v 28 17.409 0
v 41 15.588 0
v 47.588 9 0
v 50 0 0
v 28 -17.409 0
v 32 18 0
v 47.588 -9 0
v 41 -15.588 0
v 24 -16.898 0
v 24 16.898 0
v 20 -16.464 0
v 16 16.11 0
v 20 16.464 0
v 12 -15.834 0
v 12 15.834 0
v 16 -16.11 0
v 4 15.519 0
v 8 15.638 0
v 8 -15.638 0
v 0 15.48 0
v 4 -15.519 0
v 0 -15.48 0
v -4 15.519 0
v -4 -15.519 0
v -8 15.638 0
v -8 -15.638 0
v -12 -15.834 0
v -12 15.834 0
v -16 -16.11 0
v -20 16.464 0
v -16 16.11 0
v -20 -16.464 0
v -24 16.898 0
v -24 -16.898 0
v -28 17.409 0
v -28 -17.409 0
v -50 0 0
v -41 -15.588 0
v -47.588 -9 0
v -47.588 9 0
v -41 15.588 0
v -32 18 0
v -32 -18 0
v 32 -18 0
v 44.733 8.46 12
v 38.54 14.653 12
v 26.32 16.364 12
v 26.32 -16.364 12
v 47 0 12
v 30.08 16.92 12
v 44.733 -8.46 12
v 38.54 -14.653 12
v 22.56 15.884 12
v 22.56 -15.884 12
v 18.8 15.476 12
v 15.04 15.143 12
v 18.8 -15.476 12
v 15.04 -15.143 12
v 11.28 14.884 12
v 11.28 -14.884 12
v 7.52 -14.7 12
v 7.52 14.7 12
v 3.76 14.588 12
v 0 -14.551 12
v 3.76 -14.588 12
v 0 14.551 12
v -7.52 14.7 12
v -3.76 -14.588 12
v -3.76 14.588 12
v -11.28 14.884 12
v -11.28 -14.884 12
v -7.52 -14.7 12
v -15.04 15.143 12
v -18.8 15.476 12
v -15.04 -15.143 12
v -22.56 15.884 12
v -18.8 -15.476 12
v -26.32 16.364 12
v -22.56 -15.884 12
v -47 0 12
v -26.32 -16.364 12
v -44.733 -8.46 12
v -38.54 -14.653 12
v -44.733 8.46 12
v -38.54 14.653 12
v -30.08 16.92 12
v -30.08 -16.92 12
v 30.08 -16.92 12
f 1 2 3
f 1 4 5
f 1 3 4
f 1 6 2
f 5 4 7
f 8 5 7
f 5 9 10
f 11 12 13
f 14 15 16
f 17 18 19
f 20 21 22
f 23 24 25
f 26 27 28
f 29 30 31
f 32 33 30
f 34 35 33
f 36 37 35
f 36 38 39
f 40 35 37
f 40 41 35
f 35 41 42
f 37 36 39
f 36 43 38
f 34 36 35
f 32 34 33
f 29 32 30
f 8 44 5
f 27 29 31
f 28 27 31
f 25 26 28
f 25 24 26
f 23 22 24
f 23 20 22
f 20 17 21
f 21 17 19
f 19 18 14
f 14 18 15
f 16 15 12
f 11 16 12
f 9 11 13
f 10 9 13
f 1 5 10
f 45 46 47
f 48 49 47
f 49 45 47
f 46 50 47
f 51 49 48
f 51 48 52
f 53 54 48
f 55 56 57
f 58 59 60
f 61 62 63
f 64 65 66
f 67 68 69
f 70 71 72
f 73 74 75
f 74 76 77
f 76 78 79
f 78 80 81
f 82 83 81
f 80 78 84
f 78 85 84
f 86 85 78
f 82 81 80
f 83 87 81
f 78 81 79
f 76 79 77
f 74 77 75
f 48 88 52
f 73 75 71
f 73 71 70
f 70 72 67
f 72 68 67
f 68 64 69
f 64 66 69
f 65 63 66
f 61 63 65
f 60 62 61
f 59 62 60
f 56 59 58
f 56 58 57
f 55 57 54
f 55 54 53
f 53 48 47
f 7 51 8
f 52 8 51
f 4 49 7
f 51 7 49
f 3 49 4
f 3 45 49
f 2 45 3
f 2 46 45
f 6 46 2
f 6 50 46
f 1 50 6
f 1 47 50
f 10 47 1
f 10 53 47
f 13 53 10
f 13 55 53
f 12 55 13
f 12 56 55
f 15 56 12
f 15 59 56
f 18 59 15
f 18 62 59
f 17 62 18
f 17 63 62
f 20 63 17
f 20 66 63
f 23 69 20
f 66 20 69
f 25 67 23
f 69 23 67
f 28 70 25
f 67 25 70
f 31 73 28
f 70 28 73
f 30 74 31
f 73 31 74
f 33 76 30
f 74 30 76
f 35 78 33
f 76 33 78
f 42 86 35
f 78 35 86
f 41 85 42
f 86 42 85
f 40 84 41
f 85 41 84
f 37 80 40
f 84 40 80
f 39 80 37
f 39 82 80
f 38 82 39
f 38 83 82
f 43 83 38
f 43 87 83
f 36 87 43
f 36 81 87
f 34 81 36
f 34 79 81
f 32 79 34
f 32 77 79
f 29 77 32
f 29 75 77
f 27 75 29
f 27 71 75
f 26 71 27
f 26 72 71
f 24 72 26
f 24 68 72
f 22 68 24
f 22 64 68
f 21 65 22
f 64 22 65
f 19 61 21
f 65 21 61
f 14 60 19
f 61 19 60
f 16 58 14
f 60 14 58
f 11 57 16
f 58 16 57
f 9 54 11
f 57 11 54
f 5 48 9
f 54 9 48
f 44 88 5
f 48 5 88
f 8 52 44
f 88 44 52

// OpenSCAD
$fn = 32;

// ----------------------------------------------------------------------
// Handle: 100 x 36 mm grip, 12 mm thick
// ----------------------------------------------------------------------

// --- parameters (mm) ---
length = 100;             // grip length
width = 36;               // grip width
thickness = 12;           // grip thickness
waist = 0.86;             // width factor at the middle
draft = 0.94;             // top face scale of the extrusion

/* ergonomic grip outline, closed spline-like polygon in the XY plane */
grip = [[-32, 18], [-28, 17.409], [-24, 16.898], [-20, 16.464], [-16, 16.11], [-12, 15.834], [-8, 15.638], [-4, 15.519], [0, 15.48], [4, 15.519], [8, 15.638], [12, 15.834], [16, 16.11], [20, 16.464], [24, 16.898], [28, 17.409], [32, 18], [41, 15.588], [47.588, 9], [50, 0], [47.588, -9], [41, -15.588], [32, -18], [32, -18], [28, -17.409], [24, -16.898], [20, -16.464], [16, -16.11], [12, -15.834], [8, -15.638], [4, -15.519], [0, -15.48], [-4, -15.519], [-8, -15.638], [-12, -15.834], [-16, -16.11], [-20, -16.464], [-24, -16.898], [-28, -17.409], [-32, -18], [-41, -15.588], [-47.588, -9], [-50, 0], [-47.588, 9], [-41, 15.588], [-32, 18]];

module grip_body() {
  linear_extrude(height = thickness, scale = draft) polygon(grip);
}

difference() {
  union() {
    grip_body();
  }
}
